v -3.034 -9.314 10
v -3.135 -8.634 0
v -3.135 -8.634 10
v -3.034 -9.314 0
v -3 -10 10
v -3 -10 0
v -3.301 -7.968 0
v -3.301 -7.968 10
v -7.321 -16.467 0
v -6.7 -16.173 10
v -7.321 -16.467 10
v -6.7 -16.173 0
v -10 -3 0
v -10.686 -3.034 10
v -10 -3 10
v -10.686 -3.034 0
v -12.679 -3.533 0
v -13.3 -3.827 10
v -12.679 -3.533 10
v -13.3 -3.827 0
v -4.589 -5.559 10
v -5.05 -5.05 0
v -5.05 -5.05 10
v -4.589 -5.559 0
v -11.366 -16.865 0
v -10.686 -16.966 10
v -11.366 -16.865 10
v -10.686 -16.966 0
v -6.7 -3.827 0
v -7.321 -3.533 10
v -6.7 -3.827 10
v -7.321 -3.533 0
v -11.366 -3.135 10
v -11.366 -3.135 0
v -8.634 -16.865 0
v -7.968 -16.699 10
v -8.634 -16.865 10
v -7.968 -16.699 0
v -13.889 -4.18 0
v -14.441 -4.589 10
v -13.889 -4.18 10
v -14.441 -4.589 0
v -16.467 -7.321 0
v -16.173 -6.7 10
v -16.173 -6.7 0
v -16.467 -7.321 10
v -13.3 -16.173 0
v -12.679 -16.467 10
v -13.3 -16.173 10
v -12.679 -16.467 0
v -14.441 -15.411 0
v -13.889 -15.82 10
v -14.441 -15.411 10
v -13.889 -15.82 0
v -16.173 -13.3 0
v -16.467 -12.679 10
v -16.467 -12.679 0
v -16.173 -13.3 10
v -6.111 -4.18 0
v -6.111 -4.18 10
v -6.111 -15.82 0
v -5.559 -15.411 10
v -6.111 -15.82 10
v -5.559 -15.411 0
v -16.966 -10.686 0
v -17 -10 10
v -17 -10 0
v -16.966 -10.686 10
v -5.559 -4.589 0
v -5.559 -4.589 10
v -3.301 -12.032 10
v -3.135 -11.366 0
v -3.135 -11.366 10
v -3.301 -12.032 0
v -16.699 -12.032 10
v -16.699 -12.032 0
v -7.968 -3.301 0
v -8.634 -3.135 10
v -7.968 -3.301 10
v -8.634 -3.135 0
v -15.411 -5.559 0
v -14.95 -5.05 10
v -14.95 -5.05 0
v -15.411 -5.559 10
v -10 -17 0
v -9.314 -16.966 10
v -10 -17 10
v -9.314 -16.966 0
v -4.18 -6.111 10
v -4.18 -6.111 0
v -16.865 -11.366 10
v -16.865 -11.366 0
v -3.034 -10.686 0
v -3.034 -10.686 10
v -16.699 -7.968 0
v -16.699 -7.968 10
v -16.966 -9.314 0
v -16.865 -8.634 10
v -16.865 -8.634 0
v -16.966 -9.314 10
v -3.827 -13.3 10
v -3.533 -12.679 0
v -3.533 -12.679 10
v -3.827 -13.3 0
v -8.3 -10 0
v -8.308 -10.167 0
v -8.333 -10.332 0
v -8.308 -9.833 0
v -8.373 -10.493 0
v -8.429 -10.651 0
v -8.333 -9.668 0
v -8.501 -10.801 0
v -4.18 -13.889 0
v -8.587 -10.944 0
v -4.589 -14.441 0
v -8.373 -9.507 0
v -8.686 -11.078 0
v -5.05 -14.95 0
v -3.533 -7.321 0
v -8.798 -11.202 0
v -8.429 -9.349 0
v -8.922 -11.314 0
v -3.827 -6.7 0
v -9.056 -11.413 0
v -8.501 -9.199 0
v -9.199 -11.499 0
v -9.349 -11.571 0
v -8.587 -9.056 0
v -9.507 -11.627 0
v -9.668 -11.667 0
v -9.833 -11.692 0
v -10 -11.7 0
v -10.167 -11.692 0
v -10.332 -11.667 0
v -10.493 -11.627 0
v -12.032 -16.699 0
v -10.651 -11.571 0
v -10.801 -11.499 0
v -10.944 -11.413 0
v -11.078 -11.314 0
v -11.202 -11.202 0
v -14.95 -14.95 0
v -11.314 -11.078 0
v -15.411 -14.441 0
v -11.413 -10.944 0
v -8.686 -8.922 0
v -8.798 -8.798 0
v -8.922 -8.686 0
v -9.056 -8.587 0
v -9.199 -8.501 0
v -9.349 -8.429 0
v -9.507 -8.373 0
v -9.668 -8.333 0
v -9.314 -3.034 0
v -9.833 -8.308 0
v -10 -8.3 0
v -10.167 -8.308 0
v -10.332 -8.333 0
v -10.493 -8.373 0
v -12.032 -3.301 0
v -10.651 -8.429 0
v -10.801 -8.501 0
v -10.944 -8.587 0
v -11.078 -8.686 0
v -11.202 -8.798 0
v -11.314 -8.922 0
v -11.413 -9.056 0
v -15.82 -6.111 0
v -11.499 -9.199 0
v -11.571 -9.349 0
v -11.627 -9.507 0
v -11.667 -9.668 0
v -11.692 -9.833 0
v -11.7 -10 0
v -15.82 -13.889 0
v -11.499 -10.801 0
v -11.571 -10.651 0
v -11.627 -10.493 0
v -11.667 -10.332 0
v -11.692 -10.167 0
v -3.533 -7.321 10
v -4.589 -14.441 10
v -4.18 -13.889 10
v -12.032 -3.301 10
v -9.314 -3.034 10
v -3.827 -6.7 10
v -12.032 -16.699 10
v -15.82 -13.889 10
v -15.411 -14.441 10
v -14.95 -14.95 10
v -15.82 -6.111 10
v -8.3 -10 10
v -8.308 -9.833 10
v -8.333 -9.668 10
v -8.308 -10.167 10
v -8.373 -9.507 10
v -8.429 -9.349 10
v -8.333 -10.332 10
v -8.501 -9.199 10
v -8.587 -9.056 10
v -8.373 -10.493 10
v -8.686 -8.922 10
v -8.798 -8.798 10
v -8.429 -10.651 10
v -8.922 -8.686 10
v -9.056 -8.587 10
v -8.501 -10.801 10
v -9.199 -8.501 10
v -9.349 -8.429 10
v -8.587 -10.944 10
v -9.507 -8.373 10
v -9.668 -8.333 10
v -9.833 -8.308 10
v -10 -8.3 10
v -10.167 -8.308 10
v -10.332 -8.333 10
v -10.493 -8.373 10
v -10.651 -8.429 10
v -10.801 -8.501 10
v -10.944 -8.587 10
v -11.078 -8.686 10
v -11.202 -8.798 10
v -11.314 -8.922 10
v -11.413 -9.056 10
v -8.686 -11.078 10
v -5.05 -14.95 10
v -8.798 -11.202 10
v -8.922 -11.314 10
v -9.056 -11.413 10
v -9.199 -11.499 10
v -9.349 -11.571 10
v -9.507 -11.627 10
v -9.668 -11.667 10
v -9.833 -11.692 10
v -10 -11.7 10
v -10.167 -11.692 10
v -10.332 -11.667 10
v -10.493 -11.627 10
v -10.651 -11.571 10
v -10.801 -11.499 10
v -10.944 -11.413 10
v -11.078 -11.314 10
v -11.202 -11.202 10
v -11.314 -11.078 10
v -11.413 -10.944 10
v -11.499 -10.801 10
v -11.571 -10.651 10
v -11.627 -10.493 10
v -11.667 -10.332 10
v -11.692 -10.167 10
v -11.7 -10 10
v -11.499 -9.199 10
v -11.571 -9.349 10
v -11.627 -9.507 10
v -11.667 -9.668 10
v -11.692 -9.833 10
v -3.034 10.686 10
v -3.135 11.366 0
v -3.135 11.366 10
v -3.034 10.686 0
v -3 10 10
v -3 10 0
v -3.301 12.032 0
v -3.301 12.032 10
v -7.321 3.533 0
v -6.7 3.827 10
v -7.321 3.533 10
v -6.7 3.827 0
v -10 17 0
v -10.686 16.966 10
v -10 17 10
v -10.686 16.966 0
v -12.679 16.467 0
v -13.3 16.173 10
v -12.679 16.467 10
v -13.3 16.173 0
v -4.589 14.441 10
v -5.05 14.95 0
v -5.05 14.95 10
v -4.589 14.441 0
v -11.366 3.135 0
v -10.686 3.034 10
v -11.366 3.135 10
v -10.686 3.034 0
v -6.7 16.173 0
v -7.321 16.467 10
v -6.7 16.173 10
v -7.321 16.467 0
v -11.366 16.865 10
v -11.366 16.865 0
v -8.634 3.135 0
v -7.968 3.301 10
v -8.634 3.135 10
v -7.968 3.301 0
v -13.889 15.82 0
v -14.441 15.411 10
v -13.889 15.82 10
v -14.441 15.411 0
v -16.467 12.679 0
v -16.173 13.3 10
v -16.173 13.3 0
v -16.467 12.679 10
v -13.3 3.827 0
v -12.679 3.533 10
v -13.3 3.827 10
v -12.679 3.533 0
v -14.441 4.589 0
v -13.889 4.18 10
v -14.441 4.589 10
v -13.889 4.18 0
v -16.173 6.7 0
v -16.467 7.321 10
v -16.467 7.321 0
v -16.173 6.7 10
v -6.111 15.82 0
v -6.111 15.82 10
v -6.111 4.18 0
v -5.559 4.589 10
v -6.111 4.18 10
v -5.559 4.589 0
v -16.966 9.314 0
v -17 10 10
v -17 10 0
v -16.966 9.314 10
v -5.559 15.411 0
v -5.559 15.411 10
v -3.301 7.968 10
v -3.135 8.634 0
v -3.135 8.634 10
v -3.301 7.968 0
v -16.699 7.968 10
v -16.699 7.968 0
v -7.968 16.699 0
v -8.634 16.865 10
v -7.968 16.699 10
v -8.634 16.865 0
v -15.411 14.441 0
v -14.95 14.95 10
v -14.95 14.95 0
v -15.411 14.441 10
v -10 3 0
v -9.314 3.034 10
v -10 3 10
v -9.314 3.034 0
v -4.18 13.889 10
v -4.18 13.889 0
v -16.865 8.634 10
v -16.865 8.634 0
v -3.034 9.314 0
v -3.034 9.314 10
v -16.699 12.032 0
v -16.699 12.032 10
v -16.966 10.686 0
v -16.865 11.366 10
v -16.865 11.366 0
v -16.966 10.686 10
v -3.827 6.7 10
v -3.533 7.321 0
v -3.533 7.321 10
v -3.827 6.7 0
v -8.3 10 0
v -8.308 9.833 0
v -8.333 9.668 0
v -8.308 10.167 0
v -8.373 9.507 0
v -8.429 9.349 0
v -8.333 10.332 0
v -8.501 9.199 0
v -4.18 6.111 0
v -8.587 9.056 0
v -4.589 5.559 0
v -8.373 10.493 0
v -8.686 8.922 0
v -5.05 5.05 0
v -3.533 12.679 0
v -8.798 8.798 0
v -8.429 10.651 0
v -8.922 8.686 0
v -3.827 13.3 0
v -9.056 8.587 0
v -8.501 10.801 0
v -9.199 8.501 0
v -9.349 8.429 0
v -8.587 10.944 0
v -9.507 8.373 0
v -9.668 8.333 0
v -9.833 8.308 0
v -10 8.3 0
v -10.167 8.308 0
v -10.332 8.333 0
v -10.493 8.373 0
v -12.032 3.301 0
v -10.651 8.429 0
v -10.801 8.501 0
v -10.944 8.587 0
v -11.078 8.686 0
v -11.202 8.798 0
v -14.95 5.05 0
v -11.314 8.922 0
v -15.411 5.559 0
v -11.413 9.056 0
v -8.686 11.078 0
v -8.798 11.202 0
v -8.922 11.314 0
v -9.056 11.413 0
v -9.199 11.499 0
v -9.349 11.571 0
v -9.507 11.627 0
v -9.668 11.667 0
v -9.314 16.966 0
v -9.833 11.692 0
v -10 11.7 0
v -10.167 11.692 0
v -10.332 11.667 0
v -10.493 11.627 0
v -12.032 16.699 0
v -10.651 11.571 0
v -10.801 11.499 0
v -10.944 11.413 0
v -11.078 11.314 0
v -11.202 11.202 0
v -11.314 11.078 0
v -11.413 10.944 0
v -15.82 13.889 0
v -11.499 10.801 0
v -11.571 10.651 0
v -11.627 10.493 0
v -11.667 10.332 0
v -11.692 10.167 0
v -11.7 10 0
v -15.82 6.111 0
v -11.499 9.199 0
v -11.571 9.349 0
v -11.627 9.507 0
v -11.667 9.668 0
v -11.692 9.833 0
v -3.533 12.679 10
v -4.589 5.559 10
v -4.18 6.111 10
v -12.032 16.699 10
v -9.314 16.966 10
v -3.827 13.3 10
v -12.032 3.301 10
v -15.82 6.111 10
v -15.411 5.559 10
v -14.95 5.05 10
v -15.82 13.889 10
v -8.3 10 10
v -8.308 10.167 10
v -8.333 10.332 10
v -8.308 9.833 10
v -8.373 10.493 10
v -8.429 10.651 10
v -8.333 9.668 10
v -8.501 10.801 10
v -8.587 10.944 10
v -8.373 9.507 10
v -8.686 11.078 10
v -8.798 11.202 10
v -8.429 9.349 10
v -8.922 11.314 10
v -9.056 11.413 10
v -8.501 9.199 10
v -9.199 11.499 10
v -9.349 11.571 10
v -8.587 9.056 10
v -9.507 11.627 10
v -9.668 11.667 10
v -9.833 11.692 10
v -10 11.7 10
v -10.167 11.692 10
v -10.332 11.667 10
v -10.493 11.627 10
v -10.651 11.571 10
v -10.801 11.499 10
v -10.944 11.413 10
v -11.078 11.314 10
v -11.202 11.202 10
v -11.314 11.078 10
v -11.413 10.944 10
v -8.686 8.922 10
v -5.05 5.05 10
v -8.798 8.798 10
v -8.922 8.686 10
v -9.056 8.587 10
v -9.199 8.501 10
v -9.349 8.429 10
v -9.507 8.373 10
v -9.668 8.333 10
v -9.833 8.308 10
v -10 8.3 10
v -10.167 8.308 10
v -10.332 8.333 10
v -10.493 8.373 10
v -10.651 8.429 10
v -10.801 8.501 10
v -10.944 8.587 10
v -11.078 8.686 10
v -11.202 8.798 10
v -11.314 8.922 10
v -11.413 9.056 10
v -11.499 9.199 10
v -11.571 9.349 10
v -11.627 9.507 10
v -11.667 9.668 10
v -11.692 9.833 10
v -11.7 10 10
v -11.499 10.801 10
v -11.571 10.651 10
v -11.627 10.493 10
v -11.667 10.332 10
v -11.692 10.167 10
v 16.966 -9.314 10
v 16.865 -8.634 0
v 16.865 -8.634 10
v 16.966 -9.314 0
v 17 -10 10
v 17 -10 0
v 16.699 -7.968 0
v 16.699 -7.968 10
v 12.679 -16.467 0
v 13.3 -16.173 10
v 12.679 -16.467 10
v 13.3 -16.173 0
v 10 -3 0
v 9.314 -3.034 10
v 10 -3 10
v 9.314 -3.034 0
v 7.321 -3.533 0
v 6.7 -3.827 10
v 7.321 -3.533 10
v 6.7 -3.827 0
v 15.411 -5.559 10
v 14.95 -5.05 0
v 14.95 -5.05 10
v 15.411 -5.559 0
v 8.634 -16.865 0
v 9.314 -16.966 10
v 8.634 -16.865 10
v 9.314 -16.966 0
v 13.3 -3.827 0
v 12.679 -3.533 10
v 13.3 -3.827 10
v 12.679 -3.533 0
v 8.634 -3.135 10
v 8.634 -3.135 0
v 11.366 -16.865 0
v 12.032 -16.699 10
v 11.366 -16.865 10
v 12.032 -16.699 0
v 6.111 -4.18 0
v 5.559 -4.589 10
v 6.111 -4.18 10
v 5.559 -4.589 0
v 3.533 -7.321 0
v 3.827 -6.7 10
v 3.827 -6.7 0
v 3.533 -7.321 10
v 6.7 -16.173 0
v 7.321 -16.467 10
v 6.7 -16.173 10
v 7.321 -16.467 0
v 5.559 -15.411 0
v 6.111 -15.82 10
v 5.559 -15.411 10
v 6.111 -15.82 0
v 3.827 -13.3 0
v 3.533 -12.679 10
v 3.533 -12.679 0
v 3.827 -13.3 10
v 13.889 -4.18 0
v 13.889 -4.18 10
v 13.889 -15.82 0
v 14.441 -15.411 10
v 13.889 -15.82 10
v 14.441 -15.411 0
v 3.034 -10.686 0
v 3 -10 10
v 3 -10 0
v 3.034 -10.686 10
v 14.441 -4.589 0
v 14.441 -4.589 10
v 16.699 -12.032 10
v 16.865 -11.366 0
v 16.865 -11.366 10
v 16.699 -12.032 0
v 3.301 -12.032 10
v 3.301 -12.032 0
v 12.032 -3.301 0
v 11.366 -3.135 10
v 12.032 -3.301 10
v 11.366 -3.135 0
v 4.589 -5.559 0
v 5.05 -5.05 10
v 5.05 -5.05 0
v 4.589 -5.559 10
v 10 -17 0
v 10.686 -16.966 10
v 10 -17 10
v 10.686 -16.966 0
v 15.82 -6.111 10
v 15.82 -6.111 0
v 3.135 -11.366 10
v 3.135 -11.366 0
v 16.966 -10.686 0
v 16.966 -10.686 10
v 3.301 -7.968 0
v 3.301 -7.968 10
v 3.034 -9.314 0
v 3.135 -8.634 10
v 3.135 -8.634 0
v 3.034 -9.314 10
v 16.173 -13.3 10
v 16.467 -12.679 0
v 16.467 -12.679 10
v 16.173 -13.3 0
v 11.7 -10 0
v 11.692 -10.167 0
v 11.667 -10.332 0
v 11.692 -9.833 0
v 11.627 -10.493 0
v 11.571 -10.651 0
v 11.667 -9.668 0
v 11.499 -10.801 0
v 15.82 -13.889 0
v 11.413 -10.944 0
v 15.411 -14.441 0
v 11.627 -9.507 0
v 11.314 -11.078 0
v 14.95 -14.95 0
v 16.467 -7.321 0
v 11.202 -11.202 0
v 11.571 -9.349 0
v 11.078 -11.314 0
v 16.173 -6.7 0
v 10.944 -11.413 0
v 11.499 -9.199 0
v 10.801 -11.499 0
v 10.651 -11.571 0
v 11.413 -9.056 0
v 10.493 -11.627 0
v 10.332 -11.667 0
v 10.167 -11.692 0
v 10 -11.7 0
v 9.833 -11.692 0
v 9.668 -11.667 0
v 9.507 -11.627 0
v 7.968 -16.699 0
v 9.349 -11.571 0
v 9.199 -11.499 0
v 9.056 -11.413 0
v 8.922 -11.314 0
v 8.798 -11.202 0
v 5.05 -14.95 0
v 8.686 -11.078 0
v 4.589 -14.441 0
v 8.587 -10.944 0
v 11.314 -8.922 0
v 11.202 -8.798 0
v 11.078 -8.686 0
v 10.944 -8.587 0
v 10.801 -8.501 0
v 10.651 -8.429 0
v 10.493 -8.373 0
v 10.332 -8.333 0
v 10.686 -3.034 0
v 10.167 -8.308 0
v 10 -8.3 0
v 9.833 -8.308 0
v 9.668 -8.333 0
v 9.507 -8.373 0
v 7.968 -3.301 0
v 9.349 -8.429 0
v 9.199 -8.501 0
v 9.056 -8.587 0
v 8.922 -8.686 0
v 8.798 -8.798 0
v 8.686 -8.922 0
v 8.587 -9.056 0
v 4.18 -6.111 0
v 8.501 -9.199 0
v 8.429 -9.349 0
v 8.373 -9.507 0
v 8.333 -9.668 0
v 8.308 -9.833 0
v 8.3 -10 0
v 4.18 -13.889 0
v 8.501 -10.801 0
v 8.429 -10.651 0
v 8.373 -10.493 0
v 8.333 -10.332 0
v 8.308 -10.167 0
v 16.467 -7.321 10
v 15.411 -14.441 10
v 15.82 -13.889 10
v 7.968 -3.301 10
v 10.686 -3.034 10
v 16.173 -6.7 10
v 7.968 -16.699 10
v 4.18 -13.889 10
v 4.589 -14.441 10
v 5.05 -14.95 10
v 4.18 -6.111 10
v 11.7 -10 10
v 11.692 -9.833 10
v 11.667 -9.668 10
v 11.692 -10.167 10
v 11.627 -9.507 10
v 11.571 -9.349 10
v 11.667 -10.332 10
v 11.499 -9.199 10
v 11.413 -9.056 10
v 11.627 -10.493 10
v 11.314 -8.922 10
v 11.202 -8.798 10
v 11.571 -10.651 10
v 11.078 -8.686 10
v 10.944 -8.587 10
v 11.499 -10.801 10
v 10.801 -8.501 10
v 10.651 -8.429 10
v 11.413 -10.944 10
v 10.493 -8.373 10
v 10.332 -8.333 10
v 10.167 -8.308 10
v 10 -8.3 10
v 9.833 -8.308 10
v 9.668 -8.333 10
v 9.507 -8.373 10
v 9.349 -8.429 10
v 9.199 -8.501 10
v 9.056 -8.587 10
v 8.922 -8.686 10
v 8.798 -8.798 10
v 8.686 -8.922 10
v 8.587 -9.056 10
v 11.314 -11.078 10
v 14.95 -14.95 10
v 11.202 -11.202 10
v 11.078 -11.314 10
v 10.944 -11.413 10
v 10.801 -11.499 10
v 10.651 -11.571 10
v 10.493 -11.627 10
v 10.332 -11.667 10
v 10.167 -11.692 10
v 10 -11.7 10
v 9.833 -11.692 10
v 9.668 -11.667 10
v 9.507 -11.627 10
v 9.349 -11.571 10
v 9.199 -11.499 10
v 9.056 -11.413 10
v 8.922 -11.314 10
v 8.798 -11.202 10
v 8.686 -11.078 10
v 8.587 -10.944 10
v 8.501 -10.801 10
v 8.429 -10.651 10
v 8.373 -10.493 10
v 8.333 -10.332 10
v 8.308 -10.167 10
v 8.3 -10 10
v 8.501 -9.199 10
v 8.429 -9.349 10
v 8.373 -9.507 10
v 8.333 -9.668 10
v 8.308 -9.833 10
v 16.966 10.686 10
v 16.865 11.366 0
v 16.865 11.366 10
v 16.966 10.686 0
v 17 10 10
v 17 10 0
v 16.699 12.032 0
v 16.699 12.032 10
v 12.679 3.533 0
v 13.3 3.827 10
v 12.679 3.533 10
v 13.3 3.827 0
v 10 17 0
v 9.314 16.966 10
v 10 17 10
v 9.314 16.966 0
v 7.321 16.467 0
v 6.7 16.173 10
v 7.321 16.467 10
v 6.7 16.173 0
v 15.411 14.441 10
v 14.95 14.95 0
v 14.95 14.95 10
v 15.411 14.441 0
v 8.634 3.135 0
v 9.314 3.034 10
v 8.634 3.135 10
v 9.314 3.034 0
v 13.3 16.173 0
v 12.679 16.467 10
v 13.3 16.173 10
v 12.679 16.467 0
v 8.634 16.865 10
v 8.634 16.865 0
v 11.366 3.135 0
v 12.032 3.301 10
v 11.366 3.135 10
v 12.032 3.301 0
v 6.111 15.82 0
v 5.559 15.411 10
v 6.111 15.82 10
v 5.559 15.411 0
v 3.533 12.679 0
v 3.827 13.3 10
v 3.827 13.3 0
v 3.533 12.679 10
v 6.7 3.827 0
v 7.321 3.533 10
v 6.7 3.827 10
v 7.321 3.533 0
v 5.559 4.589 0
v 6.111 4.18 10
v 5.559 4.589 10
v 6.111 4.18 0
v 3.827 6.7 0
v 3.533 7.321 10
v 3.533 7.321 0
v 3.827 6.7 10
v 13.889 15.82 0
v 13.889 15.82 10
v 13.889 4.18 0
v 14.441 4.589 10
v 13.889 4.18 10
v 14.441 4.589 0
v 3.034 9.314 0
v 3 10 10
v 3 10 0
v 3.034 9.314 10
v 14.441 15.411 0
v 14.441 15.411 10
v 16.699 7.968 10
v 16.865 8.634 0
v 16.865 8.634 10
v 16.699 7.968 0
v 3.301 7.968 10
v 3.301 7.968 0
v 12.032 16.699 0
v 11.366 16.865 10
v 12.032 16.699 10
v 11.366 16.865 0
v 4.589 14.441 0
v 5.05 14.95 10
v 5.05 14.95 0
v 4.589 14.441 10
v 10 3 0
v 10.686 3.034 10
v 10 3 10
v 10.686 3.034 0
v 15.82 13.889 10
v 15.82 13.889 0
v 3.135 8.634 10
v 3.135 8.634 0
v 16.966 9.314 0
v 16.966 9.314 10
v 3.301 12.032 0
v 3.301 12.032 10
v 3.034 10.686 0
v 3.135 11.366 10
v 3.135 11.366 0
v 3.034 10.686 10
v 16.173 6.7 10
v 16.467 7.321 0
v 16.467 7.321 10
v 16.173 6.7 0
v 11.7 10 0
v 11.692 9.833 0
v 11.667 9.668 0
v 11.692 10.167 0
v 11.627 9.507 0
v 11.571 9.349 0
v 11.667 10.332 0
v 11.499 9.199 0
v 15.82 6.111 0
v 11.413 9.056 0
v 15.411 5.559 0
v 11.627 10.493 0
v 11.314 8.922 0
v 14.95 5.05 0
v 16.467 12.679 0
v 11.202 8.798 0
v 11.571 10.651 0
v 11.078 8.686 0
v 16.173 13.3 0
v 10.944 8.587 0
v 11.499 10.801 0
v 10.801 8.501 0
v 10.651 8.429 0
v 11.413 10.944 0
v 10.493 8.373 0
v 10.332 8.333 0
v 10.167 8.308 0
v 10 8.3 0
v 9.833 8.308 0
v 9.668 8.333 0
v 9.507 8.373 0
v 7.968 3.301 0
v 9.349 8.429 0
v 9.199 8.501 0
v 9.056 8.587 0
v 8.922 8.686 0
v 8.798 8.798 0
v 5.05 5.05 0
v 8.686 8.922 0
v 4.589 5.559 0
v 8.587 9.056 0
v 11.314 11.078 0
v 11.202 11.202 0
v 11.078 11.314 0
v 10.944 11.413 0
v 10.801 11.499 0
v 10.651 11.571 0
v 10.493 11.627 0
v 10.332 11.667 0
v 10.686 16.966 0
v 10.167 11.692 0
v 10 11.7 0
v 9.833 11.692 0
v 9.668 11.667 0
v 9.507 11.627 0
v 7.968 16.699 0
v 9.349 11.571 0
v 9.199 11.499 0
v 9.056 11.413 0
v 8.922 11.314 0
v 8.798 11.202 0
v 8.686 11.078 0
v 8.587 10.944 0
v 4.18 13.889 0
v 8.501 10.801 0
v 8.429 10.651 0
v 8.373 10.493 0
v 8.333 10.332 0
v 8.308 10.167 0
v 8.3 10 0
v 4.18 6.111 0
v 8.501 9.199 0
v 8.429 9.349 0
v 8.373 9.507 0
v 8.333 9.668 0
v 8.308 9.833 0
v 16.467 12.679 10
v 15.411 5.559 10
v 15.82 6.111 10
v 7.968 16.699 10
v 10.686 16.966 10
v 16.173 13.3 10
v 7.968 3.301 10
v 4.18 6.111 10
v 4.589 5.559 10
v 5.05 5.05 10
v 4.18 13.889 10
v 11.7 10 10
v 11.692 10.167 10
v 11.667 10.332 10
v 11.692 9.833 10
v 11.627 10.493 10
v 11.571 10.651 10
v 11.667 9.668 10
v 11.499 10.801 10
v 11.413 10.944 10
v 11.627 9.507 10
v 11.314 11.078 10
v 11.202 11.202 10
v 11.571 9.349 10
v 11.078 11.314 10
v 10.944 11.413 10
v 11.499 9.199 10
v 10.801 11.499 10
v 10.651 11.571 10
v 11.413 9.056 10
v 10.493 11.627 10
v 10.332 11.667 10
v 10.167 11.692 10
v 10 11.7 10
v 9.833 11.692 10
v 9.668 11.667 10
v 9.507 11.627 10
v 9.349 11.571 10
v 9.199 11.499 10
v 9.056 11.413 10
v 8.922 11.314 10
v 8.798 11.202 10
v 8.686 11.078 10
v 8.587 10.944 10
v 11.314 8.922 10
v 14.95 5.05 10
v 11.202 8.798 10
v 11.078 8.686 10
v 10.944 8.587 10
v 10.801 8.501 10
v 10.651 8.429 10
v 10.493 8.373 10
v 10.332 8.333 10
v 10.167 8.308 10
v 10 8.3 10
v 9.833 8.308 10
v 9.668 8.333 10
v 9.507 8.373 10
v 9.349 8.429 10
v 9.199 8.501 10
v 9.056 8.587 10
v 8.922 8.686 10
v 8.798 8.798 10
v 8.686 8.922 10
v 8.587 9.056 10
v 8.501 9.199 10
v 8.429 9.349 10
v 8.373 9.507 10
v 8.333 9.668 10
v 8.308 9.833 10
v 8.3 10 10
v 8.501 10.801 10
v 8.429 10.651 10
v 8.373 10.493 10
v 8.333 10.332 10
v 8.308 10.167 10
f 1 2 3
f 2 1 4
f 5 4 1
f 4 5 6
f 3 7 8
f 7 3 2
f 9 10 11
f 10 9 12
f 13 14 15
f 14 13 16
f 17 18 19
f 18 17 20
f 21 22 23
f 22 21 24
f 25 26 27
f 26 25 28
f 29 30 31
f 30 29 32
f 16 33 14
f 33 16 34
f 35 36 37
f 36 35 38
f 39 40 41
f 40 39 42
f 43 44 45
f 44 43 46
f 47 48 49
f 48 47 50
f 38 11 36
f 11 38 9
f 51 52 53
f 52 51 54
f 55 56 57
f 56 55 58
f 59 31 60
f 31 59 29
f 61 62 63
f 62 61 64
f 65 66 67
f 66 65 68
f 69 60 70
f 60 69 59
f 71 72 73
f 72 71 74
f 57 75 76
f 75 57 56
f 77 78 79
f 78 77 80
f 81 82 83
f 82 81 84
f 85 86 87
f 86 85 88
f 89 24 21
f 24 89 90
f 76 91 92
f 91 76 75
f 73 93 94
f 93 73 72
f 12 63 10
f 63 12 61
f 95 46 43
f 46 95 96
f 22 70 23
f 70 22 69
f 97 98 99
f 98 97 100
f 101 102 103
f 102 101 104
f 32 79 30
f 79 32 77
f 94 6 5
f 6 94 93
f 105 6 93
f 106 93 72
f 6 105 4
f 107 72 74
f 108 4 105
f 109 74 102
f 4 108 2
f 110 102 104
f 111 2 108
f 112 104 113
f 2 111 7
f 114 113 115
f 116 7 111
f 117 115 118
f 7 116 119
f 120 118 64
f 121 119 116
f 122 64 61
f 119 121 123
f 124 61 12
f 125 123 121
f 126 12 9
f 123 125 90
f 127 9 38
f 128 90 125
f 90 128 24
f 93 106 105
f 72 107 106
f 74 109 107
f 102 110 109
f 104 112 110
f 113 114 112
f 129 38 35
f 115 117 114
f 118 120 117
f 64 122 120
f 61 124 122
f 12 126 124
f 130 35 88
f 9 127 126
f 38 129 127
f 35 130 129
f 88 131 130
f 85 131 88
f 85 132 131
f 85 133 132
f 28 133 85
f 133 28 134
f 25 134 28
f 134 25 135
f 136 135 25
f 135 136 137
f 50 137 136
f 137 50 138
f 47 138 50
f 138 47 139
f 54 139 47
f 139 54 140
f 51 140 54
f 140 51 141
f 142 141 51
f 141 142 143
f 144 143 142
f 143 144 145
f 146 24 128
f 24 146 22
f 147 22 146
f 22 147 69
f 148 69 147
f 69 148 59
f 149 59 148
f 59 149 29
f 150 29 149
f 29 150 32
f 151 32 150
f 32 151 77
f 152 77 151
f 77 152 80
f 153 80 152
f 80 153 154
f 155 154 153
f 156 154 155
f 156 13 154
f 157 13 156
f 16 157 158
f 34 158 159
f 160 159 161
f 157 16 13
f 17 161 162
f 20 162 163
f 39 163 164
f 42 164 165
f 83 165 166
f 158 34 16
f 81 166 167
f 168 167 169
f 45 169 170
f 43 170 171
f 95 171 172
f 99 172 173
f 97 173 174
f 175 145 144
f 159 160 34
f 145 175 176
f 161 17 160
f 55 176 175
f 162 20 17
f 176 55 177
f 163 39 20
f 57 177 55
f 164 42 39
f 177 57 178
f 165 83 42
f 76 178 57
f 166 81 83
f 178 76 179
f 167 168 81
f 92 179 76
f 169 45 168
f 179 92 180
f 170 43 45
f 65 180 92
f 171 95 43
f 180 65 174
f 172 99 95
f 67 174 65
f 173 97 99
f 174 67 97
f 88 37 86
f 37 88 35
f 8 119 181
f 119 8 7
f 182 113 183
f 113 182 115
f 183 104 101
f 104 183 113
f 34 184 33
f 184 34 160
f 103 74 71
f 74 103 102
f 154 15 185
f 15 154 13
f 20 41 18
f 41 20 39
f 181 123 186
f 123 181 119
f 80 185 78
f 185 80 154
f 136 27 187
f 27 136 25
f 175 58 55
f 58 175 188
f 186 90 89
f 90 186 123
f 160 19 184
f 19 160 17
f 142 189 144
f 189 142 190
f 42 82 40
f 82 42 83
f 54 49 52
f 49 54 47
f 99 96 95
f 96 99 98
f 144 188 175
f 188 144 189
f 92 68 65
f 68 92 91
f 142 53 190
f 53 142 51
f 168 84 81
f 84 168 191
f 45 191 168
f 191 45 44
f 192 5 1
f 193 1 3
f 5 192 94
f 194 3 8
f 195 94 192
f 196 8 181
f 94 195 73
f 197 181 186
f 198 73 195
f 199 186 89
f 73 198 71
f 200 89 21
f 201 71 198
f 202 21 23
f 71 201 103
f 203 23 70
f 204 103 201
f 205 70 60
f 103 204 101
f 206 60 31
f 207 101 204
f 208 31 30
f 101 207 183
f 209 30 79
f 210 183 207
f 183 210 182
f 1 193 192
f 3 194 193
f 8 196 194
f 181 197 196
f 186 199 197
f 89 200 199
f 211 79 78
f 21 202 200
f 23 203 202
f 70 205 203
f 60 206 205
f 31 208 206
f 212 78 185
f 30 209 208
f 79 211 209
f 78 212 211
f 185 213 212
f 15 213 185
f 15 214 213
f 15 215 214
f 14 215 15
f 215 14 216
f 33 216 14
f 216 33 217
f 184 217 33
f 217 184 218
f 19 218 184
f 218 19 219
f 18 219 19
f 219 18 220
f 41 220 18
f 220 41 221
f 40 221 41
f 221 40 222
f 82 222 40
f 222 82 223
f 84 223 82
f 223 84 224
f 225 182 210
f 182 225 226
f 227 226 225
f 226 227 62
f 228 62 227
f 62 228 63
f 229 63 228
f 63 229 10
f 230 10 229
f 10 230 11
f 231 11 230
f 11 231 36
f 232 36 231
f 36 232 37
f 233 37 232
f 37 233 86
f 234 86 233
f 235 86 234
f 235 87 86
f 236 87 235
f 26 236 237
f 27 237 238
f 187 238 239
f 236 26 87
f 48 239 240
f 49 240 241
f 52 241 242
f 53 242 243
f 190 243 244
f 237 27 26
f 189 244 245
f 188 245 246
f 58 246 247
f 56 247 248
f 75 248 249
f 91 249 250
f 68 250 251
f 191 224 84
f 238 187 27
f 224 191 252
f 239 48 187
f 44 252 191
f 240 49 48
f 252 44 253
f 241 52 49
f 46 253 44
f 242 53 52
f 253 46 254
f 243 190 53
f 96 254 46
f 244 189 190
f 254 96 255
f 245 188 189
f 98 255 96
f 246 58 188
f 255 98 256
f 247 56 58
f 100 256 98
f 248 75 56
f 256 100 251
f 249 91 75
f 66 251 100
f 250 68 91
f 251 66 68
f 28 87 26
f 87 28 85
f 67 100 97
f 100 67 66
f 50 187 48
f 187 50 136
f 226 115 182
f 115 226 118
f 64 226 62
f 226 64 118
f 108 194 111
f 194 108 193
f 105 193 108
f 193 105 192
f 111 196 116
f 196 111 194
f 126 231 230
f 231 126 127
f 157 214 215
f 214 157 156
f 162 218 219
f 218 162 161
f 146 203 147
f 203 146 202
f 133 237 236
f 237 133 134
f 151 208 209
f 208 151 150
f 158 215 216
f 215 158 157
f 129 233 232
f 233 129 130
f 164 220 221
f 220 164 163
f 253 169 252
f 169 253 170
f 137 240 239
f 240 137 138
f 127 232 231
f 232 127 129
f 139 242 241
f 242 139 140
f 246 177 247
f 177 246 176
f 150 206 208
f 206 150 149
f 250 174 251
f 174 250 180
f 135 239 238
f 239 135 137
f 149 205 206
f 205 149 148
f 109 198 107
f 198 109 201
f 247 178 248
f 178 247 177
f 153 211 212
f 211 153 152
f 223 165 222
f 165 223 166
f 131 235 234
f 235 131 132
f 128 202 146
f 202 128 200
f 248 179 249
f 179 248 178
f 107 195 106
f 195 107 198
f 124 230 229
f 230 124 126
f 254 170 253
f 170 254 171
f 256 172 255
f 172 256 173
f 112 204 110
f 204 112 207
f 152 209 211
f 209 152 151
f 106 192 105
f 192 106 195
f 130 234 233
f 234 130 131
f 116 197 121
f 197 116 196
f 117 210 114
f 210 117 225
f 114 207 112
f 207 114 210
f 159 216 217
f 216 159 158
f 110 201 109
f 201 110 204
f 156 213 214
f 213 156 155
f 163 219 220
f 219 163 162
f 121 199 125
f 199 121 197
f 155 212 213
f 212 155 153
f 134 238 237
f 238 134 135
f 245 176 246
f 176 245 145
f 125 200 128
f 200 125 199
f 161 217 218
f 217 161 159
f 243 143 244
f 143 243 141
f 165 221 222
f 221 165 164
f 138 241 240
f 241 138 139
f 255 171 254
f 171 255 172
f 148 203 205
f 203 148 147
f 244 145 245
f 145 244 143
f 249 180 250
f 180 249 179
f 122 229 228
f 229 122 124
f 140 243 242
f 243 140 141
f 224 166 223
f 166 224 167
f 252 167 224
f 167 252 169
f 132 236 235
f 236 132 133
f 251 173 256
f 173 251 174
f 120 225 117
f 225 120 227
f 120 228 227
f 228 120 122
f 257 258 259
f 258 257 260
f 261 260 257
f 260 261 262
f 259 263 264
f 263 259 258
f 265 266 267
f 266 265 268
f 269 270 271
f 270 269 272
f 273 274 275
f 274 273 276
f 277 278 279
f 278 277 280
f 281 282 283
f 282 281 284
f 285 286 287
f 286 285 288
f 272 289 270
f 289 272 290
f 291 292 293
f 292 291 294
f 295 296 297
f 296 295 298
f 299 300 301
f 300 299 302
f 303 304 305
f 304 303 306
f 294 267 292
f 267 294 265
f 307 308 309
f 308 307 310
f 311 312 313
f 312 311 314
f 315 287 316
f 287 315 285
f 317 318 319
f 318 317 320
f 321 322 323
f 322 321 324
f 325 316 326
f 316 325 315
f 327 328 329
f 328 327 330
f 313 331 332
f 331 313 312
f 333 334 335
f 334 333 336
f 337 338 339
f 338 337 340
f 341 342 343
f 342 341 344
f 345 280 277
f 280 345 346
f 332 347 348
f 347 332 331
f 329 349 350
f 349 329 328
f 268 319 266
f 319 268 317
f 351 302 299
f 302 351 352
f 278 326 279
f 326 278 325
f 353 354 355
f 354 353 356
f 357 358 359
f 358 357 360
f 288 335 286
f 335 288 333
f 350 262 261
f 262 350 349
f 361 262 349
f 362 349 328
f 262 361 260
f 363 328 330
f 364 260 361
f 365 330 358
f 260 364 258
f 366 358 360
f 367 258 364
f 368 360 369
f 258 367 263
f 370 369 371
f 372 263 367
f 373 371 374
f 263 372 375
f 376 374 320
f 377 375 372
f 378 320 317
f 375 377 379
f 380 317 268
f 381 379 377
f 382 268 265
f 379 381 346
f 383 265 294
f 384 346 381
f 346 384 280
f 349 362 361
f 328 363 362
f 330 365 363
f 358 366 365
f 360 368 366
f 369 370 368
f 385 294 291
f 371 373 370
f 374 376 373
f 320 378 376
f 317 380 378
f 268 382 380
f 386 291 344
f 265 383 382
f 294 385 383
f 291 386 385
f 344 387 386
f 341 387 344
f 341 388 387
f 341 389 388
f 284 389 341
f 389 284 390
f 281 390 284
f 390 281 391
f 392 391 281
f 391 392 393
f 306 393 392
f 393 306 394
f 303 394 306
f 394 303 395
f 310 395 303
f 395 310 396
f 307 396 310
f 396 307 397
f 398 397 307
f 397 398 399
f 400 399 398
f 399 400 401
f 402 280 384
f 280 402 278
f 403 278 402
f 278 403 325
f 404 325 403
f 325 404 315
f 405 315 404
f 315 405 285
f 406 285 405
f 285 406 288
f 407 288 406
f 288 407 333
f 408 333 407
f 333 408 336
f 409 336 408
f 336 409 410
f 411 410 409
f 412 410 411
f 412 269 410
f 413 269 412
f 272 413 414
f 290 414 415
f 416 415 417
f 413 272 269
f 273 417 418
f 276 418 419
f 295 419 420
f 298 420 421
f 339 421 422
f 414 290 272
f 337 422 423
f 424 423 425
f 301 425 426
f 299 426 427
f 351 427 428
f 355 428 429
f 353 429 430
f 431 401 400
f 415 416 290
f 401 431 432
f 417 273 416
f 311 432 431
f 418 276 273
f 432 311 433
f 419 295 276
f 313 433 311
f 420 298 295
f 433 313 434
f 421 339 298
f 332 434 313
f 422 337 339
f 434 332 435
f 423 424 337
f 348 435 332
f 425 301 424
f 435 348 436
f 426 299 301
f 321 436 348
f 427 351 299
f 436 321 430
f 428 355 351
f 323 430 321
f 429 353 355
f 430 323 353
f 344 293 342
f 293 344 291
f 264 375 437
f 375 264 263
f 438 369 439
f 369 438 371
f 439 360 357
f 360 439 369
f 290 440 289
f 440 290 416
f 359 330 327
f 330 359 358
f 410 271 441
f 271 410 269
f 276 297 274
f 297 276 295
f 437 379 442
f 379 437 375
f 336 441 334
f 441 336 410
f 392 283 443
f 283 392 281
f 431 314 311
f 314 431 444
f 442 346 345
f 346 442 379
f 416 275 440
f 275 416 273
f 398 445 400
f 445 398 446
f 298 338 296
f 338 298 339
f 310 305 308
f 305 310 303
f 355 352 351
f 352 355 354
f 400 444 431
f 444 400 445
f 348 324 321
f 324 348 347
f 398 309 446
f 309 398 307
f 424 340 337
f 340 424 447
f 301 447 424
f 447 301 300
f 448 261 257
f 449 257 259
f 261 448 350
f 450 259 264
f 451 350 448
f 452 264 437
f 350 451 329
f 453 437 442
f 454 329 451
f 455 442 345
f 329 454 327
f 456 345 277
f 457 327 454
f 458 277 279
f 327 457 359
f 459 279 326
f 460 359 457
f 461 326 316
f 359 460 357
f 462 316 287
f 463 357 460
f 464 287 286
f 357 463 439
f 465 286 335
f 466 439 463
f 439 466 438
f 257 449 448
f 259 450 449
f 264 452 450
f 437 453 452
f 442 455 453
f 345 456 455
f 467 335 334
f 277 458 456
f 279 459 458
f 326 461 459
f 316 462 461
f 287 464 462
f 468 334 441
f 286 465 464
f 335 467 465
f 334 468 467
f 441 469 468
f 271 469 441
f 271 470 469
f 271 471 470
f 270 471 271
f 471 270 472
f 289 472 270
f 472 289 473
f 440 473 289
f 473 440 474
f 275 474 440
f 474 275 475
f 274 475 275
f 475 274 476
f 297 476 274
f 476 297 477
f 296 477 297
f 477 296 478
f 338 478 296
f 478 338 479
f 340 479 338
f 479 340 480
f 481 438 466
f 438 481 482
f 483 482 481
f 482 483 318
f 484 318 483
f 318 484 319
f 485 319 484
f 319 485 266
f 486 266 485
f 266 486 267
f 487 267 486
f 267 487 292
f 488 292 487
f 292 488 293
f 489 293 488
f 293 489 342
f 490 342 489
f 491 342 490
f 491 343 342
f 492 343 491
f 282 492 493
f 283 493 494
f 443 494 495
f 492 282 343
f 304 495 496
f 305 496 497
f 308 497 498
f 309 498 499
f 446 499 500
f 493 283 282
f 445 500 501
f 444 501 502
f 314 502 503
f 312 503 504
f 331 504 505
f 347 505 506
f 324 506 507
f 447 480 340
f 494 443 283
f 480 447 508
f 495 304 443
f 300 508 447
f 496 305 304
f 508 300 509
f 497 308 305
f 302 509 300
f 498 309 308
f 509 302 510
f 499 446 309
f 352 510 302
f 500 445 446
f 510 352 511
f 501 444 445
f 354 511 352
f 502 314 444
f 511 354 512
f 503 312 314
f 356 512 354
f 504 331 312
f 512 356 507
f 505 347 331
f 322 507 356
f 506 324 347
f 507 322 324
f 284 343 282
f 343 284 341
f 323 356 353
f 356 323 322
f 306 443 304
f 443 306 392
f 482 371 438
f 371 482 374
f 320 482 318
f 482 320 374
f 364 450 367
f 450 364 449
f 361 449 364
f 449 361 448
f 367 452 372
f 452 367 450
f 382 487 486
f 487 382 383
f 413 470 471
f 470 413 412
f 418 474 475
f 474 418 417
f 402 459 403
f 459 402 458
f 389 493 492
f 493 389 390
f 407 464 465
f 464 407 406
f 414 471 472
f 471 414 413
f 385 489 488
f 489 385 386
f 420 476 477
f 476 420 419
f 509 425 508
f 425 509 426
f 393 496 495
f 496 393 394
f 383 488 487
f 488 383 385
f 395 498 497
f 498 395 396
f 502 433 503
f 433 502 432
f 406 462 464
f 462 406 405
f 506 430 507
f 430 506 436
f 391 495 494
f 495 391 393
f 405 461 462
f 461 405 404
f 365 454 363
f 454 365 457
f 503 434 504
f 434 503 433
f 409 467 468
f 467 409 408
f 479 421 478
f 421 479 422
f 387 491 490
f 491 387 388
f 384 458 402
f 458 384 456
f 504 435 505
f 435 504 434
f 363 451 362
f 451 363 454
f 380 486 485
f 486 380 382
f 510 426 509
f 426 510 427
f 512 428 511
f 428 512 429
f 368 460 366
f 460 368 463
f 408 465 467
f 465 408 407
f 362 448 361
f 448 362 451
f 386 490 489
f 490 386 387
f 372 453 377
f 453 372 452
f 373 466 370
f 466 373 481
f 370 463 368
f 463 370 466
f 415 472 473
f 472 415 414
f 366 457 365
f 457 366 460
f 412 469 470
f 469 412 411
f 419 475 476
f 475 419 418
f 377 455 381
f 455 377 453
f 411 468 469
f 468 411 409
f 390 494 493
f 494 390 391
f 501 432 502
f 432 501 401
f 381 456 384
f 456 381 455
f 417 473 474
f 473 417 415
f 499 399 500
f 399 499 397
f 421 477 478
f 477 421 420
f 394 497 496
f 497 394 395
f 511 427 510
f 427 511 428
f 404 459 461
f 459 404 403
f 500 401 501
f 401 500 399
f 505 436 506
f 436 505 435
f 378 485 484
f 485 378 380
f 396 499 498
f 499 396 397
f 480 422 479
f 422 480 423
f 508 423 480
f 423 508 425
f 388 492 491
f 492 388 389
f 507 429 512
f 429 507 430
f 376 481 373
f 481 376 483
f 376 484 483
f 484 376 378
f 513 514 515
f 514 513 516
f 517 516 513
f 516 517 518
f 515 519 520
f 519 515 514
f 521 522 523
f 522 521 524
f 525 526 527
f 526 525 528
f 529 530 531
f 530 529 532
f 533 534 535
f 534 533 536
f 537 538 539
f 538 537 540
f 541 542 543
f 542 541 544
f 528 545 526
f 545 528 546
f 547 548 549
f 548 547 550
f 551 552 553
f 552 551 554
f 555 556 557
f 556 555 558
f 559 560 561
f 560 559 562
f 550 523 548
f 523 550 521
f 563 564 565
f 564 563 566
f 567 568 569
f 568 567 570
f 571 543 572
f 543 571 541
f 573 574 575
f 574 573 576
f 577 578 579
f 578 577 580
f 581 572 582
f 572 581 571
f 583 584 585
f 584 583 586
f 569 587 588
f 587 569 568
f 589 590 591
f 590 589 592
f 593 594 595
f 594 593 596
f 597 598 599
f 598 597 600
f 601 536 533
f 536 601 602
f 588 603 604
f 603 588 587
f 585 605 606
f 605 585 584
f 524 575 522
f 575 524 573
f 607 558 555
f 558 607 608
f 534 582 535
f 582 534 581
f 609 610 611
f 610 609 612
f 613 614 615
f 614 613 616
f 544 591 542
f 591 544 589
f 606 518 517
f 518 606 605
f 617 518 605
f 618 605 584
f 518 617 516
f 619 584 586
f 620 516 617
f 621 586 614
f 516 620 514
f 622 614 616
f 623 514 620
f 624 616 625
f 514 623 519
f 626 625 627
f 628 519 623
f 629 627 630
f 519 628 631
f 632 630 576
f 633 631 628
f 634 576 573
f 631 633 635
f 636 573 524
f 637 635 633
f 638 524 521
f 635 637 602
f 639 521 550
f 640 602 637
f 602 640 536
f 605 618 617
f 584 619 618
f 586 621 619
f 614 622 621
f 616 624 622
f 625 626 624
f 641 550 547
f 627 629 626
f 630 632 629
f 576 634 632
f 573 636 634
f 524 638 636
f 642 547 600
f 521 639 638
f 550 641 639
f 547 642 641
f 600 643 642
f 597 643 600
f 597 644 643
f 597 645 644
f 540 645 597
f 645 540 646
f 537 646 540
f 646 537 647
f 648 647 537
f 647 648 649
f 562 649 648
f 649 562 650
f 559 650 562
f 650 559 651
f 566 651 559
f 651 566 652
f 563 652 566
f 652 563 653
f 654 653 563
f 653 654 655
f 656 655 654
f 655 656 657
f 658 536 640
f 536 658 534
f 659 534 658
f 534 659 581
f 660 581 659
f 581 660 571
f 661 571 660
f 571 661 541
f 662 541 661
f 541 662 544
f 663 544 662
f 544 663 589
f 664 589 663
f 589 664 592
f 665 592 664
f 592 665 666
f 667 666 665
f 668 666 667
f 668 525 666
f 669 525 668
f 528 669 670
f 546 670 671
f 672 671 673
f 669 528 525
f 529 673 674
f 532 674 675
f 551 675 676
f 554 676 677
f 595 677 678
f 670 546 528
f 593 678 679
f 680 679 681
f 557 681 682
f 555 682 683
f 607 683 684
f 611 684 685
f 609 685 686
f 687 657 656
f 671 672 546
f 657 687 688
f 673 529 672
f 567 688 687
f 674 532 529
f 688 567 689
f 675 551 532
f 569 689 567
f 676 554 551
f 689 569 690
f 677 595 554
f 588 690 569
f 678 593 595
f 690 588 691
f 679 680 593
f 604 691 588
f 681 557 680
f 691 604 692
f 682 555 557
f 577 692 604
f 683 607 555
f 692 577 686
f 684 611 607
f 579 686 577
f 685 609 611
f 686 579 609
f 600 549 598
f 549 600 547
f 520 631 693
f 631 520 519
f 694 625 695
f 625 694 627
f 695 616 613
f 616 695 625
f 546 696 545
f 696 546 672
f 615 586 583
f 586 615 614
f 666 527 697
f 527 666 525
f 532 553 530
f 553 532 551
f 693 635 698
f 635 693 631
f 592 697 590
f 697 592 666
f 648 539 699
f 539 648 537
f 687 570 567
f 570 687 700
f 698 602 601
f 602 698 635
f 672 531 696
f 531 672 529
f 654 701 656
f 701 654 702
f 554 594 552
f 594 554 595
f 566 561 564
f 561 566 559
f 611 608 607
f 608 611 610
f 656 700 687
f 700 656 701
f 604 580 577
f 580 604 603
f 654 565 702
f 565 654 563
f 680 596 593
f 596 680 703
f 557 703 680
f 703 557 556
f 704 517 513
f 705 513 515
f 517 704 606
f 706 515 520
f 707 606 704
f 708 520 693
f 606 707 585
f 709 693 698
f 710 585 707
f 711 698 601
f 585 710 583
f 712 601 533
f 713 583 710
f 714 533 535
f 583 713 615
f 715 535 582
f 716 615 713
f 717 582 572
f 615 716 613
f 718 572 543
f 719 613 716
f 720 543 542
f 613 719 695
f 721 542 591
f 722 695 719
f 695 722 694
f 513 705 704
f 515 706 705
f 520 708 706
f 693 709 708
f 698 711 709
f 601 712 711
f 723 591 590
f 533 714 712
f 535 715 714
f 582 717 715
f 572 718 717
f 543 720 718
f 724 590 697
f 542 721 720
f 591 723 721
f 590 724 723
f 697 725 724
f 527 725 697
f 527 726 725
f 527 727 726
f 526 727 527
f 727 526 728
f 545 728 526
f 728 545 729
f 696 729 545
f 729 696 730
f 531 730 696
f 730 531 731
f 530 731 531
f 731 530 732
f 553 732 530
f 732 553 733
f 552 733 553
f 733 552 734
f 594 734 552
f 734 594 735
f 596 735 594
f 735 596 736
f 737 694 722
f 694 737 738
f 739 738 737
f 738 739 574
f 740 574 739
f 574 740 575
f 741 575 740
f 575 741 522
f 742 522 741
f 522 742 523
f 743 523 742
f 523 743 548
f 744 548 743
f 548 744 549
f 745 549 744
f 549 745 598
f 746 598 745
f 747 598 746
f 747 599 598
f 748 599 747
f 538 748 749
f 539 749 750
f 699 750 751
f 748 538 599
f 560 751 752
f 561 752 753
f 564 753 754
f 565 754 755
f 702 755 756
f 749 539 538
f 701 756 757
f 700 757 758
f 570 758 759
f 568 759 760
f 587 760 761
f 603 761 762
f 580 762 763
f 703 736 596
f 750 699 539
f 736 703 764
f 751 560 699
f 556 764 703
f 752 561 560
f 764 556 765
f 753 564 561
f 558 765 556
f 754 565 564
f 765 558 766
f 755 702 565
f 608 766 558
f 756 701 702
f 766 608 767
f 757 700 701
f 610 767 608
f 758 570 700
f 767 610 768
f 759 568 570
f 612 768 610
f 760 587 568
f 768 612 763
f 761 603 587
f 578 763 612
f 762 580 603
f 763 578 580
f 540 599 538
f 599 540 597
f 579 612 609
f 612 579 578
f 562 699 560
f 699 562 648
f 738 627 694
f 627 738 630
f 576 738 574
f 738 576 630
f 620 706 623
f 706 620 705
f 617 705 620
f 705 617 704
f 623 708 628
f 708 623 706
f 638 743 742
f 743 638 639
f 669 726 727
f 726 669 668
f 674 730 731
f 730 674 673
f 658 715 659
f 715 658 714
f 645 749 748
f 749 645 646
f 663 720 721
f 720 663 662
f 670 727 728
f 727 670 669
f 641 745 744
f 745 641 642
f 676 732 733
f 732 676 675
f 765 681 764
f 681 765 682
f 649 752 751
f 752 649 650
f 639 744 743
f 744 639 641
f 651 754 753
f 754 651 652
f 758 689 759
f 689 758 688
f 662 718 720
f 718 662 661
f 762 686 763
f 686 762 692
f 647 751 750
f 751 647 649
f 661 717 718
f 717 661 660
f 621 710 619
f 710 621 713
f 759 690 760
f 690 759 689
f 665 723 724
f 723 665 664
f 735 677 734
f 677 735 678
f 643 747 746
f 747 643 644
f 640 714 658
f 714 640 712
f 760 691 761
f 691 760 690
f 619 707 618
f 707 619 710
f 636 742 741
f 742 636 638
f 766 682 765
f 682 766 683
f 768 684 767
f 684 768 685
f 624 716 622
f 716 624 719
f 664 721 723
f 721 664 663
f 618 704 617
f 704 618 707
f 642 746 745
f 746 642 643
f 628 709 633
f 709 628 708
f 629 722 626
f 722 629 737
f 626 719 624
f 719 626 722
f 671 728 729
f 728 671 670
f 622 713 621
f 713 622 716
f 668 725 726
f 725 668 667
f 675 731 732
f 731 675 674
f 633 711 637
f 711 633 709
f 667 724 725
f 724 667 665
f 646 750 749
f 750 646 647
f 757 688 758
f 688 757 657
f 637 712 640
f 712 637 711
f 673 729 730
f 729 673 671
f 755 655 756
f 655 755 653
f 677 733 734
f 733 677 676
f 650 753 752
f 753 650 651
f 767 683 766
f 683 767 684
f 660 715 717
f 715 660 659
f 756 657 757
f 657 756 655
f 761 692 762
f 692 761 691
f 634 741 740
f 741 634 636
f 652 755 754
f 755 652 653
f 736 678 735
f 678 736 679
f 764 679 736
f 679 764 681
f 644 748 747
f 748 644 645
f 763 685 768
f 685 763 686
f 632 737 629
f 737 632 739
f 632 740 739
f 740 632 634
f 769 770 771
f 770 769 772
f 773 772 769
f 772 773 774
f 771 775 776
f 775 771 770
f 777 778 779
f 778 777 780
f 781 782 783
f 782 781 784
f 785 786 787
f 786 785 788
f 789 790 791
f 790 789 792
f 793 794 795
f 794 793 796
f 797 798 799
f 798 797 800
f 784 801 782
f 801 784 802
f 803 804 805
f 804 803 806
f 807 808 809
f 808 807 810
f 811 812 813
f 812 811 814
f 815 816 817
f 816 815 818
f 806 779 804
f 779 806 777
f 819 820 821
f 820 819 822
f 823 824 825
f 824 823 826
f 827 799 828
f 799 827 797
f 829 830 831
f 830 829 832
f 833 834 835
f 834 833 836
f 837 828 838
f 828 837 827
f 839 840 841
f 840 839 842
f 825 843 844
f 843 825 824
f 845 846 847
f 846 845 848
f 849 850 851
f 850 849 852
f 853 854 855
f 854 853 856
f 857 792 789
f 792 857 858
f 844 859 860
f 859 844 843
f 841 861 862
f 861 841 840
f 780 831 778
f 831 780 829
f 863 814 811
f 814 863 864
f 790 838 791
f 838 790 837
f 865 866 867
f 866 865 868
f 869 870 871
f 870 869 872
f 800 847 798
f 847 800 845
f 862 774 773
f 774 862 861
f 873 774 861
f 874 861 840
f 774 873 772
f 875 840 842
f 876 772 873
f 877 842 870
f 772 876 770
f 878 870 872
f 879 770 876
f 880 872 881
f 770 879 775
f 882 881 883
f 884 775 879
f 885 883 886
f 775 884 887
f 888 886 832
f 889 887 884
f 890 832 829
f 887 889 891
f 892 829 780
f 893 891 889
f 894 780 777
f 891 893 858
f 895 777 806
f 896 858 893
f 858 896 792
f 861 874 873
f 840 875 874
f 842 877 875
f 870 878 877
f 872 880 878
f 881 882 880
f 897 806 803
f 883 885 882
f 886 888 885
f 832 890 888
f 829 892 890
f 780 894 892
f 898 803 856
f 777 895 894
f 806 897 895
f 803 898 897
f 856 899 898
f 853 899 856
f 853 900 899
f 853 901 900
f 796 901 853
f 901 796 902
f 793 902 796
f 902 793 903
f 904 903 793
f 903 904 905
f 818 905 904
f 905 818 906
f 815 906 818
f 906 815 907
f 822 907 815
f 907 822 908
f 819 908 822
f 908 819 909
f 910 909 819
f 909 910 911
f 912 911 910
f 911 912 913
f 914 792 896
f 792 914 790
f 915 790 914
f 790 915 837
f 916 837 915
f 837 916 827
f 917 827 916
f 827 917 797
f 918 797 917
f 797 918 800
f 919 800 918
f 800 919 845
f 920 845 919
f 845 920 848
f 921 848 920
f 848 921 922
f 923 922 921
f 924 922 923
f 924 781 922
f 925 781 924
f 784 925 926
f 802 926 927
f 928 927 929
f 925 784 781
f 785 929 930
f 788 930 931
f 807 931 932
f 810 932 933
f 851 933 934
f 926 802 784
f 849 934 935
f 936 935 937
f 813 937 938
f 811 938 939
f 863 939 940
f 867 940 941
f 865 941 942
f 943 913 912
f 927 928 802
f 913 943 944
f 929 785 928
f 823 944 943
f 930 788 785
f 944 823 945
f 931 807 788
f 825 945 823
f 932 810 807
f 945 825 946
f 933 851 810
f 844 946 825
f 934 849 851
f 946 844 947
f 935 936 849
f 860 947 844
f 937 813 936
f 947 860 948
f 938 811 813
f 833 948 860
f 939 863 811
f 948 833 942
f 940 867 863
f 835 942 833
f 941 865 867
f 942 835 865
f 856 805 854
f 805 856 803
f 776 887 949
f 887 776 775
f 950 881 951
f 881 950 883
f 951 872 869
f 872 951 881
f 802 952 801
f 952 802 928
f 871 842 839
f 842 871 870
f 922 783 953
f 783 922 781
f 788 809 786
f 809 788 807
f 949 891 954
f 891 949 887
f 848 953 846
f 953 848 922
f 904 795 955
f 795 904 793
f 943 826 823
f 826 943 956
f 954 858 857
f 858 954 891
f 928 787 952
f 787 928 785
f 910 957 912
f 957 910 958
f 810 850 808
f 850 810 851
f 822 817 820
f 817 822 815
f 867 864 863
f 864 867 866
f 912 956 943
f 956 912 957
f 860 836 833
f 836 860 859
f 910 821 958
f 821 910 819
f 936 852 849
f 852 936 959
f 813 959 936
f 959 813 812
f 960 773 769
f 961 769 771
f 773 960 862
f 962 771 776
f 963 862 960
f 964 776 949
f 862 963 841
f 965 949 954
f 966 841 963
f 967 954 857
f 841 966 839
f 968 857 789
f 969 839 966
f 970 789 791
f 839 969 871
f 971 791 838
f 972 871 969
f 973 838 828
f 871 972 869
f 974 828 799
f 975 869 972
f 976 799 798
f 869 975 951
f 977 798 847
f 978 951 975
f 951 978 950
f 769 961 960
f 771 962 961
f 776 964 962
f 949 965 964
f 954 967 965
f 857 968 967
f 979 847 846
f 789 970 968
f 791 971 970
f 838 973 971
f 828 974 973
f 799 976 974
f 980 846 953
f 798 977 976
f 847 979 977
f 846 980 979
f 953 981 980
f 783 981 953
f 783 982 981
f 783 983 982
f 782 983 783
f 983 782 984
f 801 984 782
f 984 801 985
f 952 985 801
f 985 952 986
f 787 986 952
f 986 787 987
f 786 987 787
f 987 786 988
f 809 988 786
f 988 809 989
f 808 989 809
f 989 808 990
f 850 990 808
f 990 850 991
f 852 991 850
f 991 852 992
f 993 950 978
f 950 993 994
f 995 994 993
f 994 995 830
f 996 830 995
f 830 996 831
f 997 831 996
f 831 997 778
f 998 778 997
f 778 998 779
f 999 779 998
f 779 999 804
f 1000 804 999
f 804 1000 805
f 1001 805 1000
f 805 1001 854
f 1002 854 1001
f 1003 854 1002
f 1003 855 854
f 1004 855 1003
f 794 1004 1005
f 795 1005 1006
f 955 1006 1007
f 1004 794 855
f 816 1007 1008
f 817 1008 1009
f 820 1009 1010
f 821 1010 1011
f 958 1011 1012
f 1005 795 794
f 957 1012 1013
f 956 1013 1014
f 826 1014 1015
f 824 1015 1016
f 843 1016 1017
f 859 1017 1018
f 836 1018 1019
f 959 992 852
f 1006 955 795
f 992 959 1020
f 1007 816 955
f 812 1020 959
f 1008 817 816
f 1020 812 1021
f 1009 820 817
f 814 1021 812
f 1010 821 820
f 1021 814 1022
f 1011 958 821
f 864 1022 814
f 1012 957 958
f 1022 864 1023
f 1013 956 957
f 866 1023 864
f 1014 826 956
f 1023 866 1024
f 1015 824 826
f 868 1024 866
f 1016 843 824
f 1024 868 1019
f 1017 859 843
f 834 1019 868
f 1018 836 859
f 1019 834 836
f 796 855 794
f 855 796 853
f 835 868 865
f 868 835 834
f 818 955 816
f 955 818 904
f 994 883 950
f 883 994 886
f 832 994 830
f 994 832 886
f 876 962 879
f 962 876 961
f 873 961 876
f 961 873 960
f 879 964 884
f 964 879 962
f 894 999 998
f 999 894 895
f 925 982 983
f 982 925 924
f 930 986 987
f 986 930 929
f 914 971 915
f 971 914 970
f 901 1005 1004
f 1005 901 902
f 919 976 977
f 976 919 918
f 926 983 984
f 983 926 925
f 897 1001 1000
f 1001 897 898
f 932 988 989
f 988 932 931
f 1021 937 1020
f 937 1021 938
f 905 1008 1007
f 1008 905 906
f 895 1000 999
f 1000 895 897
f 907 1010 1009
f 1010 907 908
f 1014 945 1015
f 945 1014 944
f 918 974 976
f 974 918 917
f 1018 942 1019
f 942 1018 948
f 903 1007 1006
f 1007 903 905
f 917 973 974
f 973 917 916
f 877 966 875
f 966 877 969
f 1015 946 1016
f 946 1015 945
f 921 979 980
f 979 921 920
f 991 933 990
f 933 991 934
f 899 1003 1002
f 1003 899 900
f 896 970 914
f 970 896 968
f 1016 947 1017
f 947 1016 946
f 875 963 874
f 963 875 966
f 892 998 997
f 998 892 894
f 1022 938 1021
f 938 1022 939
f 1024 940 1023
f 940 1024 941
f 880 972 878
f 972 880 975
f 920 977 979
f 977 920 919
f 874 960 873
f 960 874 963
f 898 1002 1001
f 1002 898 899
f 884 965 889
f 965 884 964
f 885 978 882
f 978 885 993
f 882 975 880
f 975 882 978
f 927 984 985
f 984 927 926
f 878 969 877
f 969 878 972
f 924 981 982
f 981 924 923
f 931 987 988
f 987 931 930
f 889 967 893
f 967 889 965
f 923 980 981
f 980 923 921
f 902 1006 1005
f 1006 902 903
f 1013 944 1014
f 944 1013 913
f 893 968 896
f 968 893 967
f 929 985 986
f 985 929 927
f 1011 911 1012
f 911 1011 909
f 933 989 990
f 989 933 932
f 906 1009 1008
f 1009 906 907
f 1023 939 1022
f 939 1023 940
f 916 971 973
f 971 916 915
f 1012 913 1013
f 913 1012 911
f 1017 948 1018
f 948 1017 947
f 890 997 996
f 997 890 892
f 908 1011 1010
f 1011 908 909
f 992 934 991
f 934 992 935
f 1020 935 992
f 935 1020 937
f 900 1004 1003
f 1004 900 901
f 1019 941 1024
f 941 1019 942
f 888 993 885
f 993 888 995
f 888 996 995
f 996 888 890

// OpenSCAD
// Unloaded motor-mount prototype; millimeters.
part="posts";
$fn=64;
module post(){difference(){cylinder(d=14,h=10);translate([0,0,-1])cylinder(d=3.4,h=12);}}
module shoe(){difference(){translate([-5.2,-9,0])cube([10.4,18,1]);translate([0,0,-1])cylinder(d=3.4,h=3);}}
if(part=="posts")for(x=[-10,10],y=[-10,10])translate([x,y,0])post();
if(part=="shoes")for(x=[-8,8],y=[-12,12])translate([x,y,0])shoe();
